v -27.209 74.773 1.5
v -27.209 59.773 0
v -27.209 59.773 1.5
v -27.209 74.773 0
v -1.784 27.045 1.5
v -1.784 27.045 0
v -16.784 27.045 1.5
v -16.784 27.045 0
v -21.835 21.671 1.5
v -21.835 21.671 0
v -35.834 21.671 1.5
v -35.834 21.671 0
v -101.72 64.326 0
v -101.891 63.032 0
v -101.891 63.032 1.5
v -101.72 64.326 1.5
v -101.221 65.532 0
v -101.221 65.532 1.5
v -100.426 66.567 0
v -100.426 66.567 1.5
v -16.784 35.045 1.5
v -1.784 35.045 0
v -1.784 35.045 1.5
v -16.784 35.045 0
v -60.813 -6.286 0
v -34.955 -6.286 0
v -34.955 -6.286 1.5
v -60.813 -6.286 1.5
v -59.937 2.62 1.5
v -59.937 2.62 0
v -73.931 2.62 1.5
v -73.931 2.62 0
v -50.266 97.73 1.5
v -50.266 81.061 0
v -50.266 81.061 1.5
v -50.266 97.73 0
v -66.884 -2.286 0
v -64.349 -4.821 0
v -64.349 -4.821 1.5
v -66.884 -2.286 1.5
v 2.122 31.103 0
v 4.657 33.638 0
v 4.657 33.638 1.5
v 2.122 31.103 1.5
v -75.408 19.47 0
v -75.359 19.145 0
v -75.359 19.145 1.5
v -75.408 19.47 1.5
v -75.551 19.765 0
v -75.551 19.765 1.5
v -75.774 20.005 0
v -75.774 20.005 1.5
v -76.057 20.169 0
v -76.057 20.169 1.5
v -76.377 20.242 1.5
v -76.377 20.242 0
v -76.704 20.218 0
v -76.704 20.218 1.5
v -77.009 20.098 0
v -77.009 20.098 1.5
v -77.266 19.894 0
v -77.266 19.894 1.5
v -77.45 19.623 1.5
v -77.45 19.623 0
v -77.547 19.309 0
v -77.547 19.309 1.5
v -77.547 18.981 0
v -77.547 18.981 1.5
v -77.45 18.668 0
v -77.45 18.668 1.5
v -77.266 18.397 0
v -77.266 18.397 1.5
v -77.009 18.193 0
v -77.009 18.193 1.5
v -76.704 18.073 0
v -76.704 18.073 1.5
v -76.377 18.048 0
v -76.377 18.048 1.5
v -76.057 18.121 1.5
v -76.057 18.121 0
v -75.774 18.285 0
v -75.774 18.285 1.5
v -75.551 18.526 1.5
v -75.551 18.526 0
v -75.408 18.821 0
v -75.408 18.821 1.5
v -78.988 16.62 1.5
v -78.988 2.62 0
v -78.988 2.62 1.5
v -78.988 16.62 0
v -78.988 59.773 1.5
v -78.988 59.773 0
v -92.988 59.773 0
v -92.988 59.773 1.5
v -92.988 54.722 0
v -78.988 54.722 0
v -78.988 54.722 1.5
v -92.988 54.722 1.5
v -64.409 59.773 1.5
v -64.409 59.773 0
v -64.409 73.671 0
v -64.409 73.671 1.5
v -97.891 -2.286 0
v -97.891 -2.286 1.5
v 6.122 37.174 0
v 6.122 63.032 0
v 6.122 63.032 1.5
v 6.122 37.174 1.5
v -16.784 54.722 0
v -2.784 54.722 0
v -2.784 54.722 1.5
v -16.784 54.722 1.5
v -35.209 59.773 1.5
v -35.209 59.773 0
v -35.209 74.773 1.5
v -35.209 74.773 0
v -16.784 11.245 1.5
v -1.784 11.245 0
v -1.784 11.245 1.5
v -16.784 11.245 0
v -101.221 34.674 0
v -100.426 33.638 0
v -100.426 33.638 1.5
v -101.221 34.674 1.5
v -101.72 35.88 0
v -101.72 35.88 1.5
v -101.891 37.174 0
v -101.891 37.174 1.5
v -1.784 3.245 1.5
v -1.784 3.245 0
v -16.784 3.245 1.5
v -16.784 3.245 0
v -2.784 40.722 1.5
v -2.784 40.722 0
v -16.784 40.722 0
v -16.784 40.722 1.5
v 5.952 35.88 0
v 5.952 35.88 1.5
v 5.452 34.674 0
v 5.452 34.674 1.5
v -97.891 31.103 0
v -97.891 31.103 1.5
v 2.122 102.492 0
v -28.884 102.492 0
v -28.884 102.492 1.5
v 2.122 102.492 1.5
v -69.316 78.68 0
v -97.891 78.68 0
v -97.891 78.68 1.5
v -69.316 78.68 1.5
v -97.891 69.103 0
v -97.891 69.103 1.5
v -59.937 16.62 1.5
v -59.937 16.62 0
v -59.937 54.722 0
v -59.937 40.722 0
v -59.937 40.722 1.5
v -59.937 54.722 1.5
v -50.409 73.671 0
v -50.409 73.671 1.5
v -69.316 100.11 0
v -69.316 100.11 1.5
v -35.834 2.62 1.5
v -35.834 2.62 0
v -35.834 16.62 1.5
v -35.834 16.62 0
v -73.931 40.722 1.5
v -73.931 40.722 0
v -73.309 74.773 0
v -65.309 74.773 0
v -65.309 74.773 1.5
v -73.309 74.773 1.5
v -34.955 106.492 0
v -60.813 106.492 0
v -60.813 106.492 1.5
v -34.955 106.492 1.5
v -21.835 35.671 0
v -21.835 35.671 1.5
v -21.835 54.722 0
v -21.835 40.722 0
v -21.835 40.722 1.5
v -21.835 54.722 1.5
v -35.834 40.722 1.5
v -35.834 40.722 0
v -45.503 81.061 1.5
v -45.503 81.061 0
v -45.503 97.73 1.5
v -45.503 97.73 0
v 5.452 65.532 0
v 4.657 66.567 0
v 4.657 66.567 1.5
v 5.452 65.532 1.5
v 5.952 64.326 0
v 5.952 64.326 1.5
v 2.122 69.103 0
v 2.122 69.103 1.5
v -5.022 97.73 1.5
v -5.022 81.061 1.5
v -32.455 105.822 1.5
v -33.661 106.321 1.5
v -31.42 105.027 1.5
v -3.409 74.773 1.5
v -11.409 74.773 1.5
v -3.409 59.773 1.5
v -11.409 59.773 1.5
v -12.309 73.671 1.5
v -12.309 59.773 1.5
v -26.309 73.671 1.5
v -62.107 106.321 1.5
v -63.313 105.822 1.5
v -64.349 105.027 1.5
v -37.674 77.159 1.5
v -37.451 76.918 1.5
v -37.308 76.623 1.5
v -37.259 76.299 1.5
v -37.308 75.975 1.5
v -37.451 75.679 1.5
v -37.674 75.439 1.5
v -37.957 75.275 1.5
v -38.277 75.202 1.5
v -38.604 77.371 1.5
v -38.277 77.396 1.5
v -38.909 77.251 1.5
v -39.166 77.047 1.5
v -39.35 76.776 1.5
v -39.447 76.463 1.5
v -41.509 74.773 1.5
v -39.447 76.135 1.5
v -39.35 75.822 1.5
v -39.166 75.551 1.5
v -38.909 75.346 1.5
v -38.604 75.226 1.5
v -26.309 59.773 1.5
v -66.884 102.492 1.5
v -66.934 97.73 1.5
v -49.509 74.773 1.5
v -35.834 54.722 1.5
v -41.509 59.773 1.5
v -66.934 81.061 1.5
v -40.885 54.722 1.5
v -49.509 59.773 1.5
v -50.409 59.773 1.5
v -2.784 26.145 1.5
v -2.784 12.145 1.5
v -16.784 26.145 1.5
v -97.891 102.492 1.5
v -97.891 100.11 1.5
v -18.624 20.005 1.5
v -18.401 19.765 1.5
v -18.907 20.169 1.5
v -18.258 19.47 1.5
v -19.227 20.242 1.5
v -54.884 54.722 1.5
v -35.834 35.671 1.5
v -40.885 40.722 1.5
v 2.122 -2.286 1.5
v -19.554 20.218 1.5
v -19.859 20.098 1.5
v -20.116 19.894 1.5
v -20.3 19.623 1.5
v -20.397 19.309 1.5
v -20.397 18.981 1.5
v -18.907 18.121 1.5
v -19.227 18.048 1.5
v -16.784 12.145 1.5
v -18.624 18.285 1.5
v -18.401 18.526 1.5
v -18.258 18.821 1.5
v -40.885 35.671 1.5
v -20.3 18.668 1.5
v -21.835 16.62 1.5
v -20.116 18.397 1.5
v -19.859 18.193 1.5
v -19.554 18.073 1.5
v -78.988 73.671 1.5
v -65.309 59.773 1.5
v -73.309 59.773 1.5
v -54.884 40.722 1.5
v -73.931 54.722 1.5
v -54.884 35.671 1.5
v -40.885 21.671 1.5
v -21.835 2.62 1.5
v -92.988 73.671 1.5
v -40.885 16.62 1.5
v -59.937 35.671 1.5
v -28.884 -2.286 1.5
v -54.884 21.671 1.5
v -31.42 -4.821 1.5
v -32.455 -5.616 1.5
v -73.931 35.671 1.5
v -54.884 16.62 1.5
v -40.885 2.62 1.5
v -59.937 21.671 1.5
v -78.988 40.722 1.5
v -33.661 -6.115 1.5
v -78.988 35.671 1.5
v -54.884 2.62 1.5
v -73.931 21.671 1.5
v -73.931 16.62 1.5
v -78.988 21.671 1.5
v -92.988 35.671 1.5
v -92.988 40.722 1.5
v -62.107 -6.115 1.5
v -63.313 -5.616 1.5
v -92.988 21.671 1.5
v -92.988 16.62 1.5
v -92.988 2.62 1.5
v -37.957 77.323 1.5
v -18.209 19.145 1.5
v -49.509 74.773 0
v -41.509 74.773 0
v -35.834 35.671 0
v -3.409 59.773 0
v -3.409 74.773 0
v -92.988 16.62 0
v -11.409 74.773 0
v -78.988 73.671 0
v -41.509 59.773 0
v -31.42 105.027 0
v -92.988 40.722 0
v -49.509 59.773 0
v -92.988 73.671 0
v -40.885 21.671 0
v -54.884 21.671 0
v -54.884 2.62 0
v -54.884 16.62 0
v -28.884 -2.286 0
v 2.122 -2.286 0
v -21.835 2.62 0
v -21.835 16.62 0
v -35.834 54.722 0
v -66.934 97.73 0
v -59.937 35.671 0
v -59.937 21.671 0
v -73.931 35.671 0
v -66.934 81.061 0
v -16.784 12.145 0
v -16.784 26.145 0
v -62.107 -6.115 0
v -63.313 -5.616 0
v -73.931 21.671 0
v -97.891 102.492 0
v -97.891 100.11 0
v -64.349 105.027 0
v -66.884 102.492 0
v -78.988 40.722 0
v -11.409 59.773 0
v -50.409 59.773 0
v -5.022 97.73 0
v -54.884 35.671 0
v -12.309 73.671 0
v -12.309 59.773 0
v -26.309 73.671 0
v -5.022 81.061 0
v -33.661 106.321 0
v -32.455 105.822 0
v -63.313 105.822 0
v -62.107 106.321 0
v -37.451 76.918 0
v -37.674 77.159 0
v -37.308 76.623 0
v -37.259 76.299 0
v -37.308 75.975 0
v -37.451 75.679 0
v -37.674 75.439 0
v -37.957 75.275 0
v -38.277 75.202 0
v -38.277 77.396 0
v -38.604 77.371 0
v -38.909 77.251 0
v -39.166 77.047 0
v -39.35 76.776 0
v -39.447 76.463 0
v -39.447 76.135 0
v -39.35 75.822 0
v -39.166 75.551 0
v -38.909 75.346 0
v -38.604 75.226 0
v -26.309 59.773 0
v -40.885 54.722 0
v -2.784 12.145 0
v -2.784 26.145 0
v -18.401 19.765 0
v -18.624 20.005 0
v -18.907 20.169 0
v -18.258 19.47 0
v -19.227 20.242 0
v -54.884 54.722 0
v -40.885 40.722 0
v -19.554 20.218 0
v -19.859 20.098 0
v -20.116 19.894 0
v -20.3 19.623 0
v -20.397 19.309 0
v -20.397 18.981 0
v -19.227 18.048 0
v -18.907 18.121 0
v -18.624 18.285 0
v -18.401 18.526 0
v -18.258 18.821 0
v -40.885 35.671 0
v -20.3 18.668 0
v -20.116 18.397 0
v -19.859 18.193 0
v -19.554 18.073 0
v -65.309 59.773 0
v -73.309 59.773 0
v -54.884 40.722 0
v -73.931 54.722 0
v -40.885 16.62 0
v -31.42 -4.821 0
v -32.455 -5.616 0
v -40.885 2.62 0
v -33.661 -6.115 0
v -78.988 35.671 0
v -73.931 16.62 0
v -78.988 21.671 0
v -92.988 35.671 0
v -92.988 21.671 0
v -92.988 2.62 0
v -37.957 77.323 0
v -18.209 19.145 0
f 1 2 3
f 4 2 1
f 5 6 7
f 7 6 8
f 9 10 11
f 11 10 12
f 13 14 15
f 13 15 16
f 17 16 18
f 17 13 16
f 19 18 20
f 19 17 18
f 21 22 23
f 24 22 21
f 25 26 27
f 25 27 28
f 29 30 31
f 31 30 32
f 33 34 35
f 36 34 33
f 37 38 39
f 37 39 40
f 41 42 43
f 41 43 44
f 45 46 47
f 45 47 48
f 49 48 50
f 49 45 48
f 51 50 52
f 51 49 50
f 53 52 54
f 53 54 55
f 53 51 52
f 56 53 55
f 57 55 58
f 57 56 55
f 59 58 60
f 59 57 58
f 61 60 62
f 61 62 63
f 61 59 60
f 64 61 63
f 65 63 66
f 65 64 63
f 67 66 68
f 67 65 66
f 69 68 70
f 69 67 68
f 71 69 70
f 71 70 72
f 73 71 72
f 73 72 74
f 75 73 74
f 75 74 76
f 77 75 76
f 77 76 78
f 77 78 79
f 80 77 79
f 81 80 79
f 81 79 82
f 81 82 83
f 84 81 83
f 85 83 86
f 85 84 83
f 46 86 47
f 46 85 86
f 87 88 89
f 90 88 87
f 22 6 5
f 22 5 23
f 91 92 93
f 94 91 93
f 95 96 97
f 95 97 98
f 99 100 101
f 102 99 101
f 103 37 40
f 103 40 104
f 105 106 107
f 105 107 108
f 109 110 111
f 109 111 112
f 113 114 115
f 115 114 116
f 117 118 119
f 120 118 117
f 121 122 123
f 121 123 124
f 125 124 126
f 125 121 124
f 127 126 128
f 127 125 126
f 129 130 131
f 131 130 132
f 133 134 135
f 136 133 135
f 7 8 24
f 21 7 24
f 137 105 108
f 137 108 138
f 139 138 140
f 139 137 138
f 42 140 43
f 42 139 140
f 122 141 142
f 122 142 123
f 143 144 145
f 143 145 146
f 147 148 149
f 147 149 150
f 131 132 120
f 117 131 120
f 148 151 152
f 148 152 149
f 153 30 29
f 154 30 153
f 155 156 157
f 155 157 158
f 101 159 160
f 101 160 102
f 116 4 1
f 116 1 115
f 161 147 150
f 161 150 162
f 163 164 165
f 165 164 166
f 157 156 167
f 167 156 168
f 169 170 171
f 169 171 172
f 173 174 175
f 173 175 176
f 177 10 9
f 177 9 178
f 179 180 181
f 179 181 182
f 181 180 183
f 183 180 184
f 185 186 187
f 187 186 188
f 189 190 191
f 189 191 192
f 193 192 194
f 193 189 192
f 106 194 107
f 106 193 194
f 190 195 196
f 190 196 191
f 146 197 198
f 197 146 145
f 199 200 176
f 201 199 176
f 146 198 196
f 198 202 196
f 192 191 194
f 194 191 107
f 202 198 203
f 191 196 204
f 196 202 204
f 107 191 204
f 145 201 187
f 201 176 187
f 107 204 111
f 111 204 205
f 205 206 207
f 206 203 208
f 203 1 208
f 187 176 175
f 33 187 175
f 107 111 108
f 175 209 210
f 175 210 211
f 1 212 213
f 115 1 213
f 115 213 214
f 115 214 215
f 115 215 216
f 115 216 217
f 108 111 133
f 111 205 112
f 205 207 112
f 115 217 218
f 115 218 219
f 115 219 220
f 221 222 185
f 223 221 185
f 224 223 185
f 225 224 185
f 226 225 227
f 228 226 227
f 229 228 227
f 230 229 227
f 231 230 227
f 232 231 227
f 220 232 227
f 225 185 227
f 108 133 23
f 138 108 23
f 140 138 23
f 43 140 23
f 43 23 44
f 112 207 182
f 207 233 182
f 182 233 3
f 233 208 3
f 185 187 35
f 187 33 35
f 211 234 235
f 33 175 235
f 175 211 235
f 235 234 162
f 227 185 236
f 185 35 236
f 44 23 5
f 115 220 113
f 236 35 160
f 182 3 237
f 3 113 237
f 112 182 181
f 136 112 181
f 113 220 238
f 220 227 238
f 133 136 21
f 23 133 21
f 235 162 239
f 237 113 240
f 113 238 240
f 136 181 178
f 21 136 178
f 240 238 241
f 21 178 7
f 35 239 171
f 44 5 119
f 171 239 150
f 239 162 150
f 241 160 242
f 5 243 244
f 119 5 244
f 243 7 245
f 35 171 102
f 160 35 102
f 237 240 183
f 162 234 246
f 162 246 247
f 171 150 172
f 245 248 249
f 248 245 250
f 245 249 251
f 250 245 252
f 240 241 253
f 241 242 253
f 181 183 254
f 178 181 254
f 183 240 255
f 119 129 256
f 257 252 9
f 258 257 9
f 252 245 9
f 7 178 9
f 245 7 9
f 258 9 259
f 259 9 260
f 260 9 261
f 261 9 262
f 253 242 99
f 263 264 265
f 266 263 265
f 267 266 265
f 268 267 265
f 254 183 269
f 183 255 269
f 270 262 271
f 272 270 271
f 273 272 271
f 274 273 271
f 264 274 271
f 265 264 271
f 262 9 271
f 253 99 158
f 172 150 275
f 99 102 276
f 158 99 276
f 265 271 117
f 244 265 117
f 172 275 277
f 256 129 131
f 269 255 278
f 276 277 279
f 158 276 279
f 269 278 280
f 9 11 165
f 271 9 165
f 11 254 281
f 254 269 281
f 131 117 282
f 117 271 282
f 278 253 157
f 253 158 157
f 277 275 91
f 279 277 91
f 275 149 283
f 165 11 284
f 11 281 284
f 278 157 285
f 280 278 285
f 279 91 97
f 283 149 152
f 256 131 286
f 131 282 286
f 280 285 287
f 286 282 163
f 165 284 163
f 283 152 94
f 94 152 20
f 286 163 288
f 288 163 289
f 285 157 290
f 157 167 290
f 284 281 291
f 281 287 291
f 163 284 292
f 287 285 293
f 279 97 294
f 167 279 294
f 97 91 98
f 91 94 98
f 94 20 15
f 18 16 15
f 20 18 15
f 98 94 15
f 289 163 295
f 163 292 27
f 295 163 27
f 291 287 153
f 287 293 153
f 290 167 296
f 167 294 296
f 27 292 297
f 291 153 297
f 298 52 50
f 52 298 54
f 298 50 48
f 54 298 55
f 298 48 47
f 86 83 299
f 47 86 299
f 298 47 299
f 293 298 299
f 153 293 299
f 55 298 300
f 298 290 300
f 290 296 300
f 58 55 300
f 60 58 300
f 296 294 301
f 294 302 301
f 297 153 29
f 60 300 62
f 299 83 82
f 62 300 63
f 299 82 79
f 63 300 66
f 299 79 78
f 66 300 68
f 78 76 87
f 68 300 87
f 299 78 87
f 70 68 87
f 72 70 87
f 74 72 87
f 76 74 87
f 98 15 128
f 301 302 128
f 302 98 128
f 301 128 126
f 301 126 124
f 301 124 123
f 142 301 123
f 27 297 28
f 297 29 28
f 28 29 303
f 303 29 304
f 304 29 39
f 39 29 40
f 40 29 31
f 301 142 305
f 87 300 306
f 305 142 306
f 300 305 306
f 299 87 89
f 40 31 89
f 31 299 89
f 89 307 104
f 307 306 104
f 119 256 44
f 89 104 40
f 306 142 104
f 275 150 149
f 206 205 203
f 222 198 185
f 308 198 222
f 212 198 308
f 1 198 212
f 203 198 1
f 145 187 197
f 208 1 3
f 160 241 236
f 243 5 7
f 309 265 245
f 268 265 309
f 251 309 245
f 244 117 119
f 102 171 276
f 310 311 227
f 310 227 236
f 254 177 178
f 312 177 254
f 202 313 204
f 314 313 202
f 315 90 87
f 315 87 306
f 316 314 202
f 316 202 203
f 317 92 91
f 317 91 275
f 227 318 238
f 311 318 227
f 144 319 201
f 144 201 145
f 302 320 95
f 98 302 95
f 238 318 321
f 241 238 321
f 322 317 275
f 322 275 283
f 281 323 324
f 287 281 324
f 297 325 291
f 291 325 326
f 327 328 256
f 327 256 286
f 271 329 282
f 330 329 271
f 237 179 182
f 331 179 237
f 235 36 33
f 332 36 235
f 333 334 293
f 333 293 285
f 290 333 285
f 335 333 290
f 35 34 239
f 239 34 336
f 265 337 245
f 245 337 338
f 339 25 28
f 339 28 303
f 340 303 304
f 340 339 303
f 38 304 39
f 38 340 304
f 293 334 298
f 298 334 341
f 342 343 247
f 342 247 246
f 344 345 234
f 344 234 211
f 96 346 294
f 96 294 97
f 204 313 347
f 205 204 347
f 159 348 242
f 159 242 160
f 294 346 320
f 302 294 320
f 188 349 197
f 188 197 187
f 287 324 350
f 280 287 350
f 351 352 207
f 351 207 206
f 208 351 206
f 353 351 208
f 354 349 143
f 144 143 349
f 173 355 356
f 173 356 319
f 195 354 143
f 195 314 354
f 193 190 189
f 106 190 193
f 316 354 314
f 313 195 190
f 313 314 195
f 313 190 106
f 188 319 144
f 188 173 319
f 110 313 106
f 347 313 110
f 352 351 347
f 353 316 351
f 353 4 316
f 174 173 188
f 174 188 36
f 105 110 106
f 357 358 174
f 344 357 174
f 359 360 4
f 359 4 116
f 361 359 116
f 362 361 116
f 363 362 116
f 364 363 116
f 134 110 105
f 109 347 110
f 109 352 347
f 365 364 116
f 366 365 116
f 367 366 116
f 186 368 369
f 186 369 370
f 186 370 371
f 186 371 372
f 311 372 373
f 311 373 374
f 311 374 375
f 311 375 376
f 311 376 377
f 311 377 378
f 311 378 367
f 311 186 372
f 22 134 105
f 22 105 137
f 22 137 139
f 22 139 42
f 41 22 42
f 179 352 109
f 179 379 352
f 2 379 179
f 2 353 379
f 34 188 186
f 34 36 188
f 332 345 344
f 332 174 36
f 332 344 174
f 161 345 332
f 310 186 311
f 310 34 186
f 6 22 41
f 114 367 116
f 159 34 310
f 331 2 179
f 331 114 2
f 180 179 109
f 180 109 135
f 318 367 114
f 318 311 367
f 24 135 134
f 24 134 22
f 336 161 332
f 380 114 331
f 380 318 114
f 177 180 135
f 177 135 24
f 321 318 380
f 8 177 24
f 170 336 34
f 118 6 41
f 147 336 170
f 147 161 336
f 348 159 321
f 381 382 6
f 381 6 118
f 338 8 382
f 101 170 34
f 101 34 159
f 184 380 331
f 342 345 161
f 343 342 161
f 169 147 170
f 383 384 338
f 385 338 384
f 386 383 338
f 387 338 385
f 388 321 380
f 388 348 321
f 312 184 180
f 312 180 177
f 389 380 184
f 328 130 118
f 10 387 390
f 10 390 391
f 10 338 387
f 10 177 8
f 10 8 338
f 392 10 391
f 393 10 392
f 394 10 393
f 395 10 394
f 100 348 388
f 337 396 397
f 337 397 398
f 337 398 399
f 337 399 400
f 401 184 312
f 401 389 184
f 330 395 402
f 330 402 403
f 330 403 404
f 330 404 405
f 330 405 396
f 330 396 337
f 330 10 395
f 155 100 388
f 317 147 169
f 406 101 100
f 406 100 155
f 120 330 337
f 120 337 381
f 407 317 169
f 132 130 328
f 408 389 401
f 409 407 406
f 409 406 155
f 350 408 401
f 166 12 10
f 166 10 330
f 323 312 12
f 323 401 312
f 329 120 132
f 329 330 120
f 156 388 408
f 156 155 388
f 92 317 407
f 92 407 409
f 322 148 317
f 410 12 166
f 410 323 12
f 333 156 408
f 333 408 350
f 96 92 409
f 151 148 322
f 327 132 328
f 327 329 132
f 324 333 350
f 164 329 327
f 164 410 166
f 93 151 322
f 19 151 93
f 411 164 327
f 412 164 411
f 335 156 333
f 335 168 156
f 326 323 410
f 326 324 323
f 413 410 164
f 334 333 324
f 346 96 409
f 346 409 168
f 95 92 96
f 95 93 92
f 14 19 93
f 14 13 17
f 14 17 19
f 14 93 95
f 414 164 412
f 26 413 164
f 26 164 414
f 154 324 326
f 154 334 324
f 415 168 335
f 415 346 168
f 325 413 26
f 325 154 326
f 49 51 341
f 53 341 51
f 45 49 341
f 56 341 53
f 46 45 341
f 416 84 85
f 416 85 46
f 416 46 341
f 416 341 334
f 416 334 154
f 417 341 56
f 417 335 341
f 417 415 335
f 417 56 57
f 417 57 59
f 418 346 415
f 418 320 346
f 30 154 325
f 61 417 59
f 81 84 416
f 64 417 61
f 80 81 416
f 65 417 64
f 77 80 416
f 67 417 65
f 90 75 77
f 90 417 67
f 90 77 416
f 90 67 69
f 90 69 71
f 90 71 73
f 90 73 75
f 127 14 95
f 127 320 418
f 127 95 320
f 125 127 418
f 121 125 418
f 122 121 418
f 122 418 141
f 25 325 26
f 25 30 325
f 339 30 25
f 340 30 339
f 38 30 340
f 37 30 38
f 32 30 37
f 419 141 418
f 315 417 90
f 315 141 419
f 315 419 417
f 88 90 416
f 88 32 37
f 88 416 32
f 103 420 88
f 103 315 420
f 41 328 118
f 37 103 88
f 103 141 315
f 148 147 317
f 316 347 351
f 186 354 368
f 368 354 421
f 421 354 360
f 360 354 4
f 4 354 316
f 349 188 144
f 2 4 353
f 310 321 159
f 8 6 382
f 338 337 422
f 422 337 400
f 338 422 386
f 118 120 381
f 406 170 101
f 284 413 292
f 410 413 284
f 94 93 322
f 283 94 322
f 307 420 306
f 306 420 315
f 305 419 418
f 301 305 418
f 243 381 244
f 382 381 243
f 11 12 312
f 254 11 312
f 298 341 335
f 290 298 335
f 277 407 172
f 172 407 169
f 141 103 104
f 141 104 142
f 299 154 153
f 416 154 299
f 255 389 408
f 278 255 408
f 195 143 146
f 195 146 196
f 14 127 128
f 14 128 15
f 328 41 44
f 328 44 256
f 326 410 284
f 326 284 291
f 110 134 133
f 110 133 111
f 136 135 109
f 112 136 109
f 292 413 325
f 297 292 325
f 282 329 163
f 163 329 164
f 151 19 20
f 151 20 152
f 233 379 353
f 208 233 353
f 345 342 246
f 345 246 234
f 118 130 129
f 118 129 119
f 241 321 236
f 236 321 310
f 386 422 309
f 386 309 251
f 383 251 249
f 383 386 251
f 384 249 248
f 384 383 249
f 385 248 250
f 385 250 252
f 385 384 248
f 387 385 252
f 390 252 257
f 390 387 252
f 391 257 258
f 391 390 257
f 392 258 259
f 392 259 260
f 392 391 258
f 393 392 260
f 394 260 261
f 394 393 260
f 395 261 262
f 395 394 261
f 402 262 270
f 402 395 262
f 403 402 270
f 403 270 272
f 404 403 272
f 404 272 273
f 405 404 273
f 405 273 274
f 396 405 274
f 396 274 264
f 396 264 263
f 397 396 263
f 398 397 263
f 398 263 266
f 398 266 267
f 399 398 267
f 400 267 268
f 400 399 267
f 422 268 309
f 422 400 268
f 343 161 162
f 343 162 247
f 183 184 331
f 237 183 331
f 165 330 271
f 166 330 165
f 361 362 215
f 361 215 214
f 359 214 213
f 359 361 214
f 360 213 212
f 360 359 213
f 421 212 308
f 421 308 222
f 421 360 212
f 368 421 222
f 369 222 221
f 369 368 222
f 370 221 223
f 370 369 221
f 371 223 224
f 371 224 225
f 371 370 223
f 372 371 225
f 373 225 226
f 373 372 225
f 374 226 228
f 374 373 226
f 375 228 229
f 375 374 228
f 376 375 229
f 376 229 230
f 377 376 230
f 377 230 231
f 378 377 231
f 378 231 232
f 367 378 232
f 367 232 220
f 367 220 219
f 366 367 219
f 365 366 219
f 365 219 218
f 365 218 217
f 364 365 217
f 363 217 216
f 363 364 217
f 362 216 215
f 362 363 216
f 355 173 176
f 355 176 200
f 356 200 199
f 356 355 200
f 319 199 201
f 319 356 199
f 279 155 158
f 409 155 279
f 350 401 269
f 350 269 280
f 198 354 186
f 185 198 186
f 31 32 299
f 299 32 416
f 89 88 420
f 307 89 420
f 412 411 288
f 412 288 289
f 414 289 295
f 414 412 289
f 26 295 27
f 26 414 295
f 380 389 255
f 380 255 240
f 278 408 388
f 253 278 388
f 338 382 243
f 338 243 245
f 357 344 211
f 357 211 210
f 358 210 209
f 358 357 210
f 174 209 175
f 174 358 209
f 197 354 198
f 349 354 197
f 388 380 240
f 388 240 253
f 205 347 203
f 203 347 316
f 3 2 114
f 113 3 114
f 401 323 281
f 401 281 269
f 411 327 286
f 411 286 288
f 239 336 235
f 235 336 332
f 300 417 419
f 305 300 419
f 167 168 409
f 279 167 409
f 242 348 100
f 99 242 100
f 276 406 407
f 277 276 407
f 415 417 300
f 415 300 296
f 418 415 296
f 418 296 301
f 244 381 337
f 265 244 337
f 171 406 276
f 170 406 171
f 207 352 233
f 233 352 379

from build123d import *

# Parameters (mm, degrees)
SKETCH2_R           = 1.1
SKETCH2_W           = 14
SKETCH2_H           = 14
SKETCH2_W_2         = 13.999864793
SKETCH2_W_3         = 13.898443713
SKETCH2_W_4         = 14.000250013
SKETCH2_H_2         = 13.999122456
SKETCH2_H_3         = 13.99899745
SKETCH2_H_4         = 13.994084704
SKETCH2_W_5         = 16.66875
SKETCH2_H_5         = 16.66875
SKETCH2_H_6         = 40.48125
SKETCH2_W_6         = 8
SKETCH2_H_7         = 15
SKETCH2_W_7         = 15
SKETCH2_H_8         = 8
BOSS_EXTRUDE1_DEPTH = 1.5


with BuildPart() as part:
    # Sketch2 → Boss-Extrude1 (new body)
    with BuildSketch(Plane(origin=(0, 0, 0), x_dir=(0, 1, 0), z_dir=(0, 0, 1))):
        with BuildLine():
            Line((78.680047039, 95.509365468), (78.680047039, 69.315615468))
            Line((78.680047039, 69.315615468), (100.110297039, 69.315615468))
            Line((100.110297039, 69.315615468), (100.110297039, 95.563583947))
            Line((100.110297039, 95.563583947), (100.110297039, 97.890615468))
            Line((100.110297039, 97.890615468), (102.491547039, 97.890615468))
            Line((102.491547039, 97.890615468), (102.491547039, 95.509365468))
            Line((102.491547039, 95.509365468), (102.491547039, 66.884365468))
            Line((102.491547039, 66.884365468), (105.027080945, 64.348831562))
            ThreePointArc((105.027080945, 64.348831562), (106.110944702, 62.726714818), (106.491547039, 60.813297656))
            Line((106.491547039, 60.813297656), (106.491547039, 34.95543328))
            ThreePointArc((106.491547039, 34.95543328), (106.110944702, 33.042016118), (105.027080945, 31.419899374))
            Line((105.027080945, 31.419899374), (102.491547039, 28.884365468))
            Line((102.491547039, 28.884365468), (102.491547039, 0.259365468))
            Line((102.491547039, 0.259365468), (102.491547039, -2.121884532))
            Line((102.491547039, -2.121884532), (69.102852155, -2.121884532))
            Line((69.102852155, -2.121884532), (66.567318249, -4.657418438))
            ThreePointArc((66.567318249, -4.657418438), (64.945201505, -5.741282195), (63.031784343, -6.121884532))
            Line((63.031784343, -6.121884532), (37.173919967, -6.121884532))
            ThreePointArc((37.173919967, -6.121884532), (35.260502805, -5.741282195), (33.638386061, -4.657418438))
            Line((33.638386061, -4.657418438), (31.102852155, -2.121884532))
            Line((31.102852155, -2.121884532), (-2.285842729, -2.121884532))
            Line((-2.285842729, -2.121884532), (-2.285842729, 28.884365468))
            Line((-2.285842729, 28.884365468), (-4.821376635, 31.419899374))
            ThreePointArc((-4.821376635, 31.419899374), (-5.905240392, 33.042016118), (-6.285842729, 34.95543328))
            Line((-6.285842729, 34.95543328), (-6.285842729, 60.813297656))
            ThreePointArc((-6.285842729, 60.813297656), (-5.905240392, 62.726714818), (-4.821376635, 64.348831562))
            Line((-4.821376635, 64.348831562), (-2.285842729, 66.884365468))
            Line((-2.285842729, 66.884365468), (-2.285842729, 97.890615468))
            Line((-2.285842729, 97.890615468), (31.102852155, 97.890615468))
            Line((31.102852155, 97.890615468), (33.638386061, 100.426149374))
            ThreePointArc((33.638386061, 100.426149374), (35.260502805, 101.510013131), (37.173919967, 101.890615468))
            Line((37.173919967, 101.890615468), (63.031784343, 101.890615468))
            ThreePointArc((63.031784343, 101.890615468), (64.945201505, 101.510013131), (66.567318249, 100.426149374))
            Line((66.567318249, 100.426149374), (69.102852155, 97.890615468))
            Line((69.102852155, 97.890615468), (78.680047039, 97.890615468))
            Line((78.680047039, 97.890615468), (78.680047039, 95.509365468))
        make_face()
        with Locations(Location((19.145407271, 76.459365468, 0), (0, 0, 270))):
            Circle(SKETCH2_R, mode=Mode.SUBTRACT)
        with Locations(Location((19.145407271, 19.309365468, 0), (0, 0, 270))):
            Circle(SKETCH2_R, mode=Mode.SUBTRACT)
        with Locations(Location((76.298797039, 38.359365468, 0), (0, 0, 270))):
            Circle(SKETCH2_R, mode=Mode.SUBTRACT)
        with Locations((19.145407271, 9.783779189)):
            Rectangle(SKETCH2_W, SKETCH2_H, mode=Mode.SUBTRACT)
        with Locations((47.721668484, 9.783779189)):
            Rectangle(SKETCH2_W_2, SKETCH2_H, mode=Mode.SUBTRACT)
        with Locations((66.721910491, 19.309365468)):
            Rectangle(SKETCH2_W_3, SKETCH2_H, mode=Mode.SUBTRACT)
        with Locations((9.619905995, 28.834302965)):
            Rectangle(SKETCH2_W_4, SKETCH2_H_2, mode=Mode.SUBTRACT)
        with Locations((28.67078354, 28.834302965)):
            Rectangle(SKETCH2_W, SKETCH2_H_2, mode=Mode.SUBTRACT)
        with Locations((47.721668484, 28.834302965)):
            Rectangle(SKETCH2_W_2, SKETCH2_H_2, mode=Mode.SUBTRACT)
        with Locations((9.619905995, 47.884365468)):
            Rectangle(SKETCH2_W_4, SKETCH2_H_3, mode=Mode.SUBTRACT)
        with Locations((28.67078354, 47.884365468)):
            Rectangle(SKETCH2_W, SKETCH2_H_3, mode=Mode.SUBTRACT)
        with Locations((47.721668484, 47.884365468)):
            Rectangle(SKETCH2_W_2, SKETCH2_H_3, mode=Mode.SUBTRACT)
        with Locations((66.721910491, 57.409365468)):
            Rectangle(SKETCH2_W_3, SKETCH2_H, mode=Mode.SUBTRACT)
        with Locations((9.619905995, 66.933889194)):
            Rectangle(SKETCH2_W_4, SKETCH2_H_4, mode=Mode.SUBTRACT)
        with Locations((28.67078354, 66.933889194)):
            Rectangle(SKETCH2_W, SKETCH2_H_4, mode=Mode.SUBTRACT)
        with Locations((47.721668484, 66.933889194)):
            Rectangle(SKETCH2_W_2, SKETCH2_H_4, mode=Mode.SUBTRACT)
        with Locations((9.619905995, 85.98779939)):
            Rectangle(SKETCH2_W_4, SKETCH2_H, mode=Mode.SUBTRACT)
        with Locations((28.67078354, 85.98779939)):
            Rectangle(SKETCH2_W, SKETCH2_H, mode=Mode.SUBTRACT)
        with Locations((47.721668484, 85.98779939)):
            Rectangle(SKETCH2_W_2, SKETCH2_H, mode=Mode.SUBTRACT)
        with Locations((66.721910491, 85.98779939)):
            Rectangle(SKETCH2_W_3, SKETCH2_H, mode=Mode.SUBTRACT)
        with Locations((89.395672039, 58.599990468)):
            Rectangle(SKETCH2_W_5, SKETCH2_H_5, mode=Mode.SUBTRACT)
        with Locations((89.395672039, 25.262490468)):
            Rectangle(SKETCH2_W_5, SKETCH2_H_6, mode=Mode.SUBTRACT)
        with Locations((31.045407271, 9.283779189)):
            Rectangle(SKETCH2_W_6, SKETCH2_H_7, mode=Mode.SUBTRACT)
        with Locations((7.245407271, 9.283779189)):
            Rectangle(SKETCH2_W_6, SKETCH2_H_7, mode=Mode.SUBTRACT)
        with Locations((67.272688635, 31.209365468)):
            Rectangle(SKETCH2_W_7, SKETCH2_H_8, mode=Mode.SUBTRACT)
        with Locations((67.272688635, 7.409365468)):
            Rectangle(SKETCH2_W_7, SKETCH2_H_8, mode=Mode.SUBTRACT)
        with Locations((67.272688635, 45.509365468)):
            Rectangle(SKETCH2_W_7, SKETCH2_H_8, mode=Mode.SUBTRACT)
        with Locations((67.272688635, 69.309365468)):
            Rectangle(SKETCH2_W_7, SKETCH2_H_8, mode=Mode.SUBTRACT)
    extrude(amount=BOSS_EXTRUDE1_DEPTH)


solid = part.part
